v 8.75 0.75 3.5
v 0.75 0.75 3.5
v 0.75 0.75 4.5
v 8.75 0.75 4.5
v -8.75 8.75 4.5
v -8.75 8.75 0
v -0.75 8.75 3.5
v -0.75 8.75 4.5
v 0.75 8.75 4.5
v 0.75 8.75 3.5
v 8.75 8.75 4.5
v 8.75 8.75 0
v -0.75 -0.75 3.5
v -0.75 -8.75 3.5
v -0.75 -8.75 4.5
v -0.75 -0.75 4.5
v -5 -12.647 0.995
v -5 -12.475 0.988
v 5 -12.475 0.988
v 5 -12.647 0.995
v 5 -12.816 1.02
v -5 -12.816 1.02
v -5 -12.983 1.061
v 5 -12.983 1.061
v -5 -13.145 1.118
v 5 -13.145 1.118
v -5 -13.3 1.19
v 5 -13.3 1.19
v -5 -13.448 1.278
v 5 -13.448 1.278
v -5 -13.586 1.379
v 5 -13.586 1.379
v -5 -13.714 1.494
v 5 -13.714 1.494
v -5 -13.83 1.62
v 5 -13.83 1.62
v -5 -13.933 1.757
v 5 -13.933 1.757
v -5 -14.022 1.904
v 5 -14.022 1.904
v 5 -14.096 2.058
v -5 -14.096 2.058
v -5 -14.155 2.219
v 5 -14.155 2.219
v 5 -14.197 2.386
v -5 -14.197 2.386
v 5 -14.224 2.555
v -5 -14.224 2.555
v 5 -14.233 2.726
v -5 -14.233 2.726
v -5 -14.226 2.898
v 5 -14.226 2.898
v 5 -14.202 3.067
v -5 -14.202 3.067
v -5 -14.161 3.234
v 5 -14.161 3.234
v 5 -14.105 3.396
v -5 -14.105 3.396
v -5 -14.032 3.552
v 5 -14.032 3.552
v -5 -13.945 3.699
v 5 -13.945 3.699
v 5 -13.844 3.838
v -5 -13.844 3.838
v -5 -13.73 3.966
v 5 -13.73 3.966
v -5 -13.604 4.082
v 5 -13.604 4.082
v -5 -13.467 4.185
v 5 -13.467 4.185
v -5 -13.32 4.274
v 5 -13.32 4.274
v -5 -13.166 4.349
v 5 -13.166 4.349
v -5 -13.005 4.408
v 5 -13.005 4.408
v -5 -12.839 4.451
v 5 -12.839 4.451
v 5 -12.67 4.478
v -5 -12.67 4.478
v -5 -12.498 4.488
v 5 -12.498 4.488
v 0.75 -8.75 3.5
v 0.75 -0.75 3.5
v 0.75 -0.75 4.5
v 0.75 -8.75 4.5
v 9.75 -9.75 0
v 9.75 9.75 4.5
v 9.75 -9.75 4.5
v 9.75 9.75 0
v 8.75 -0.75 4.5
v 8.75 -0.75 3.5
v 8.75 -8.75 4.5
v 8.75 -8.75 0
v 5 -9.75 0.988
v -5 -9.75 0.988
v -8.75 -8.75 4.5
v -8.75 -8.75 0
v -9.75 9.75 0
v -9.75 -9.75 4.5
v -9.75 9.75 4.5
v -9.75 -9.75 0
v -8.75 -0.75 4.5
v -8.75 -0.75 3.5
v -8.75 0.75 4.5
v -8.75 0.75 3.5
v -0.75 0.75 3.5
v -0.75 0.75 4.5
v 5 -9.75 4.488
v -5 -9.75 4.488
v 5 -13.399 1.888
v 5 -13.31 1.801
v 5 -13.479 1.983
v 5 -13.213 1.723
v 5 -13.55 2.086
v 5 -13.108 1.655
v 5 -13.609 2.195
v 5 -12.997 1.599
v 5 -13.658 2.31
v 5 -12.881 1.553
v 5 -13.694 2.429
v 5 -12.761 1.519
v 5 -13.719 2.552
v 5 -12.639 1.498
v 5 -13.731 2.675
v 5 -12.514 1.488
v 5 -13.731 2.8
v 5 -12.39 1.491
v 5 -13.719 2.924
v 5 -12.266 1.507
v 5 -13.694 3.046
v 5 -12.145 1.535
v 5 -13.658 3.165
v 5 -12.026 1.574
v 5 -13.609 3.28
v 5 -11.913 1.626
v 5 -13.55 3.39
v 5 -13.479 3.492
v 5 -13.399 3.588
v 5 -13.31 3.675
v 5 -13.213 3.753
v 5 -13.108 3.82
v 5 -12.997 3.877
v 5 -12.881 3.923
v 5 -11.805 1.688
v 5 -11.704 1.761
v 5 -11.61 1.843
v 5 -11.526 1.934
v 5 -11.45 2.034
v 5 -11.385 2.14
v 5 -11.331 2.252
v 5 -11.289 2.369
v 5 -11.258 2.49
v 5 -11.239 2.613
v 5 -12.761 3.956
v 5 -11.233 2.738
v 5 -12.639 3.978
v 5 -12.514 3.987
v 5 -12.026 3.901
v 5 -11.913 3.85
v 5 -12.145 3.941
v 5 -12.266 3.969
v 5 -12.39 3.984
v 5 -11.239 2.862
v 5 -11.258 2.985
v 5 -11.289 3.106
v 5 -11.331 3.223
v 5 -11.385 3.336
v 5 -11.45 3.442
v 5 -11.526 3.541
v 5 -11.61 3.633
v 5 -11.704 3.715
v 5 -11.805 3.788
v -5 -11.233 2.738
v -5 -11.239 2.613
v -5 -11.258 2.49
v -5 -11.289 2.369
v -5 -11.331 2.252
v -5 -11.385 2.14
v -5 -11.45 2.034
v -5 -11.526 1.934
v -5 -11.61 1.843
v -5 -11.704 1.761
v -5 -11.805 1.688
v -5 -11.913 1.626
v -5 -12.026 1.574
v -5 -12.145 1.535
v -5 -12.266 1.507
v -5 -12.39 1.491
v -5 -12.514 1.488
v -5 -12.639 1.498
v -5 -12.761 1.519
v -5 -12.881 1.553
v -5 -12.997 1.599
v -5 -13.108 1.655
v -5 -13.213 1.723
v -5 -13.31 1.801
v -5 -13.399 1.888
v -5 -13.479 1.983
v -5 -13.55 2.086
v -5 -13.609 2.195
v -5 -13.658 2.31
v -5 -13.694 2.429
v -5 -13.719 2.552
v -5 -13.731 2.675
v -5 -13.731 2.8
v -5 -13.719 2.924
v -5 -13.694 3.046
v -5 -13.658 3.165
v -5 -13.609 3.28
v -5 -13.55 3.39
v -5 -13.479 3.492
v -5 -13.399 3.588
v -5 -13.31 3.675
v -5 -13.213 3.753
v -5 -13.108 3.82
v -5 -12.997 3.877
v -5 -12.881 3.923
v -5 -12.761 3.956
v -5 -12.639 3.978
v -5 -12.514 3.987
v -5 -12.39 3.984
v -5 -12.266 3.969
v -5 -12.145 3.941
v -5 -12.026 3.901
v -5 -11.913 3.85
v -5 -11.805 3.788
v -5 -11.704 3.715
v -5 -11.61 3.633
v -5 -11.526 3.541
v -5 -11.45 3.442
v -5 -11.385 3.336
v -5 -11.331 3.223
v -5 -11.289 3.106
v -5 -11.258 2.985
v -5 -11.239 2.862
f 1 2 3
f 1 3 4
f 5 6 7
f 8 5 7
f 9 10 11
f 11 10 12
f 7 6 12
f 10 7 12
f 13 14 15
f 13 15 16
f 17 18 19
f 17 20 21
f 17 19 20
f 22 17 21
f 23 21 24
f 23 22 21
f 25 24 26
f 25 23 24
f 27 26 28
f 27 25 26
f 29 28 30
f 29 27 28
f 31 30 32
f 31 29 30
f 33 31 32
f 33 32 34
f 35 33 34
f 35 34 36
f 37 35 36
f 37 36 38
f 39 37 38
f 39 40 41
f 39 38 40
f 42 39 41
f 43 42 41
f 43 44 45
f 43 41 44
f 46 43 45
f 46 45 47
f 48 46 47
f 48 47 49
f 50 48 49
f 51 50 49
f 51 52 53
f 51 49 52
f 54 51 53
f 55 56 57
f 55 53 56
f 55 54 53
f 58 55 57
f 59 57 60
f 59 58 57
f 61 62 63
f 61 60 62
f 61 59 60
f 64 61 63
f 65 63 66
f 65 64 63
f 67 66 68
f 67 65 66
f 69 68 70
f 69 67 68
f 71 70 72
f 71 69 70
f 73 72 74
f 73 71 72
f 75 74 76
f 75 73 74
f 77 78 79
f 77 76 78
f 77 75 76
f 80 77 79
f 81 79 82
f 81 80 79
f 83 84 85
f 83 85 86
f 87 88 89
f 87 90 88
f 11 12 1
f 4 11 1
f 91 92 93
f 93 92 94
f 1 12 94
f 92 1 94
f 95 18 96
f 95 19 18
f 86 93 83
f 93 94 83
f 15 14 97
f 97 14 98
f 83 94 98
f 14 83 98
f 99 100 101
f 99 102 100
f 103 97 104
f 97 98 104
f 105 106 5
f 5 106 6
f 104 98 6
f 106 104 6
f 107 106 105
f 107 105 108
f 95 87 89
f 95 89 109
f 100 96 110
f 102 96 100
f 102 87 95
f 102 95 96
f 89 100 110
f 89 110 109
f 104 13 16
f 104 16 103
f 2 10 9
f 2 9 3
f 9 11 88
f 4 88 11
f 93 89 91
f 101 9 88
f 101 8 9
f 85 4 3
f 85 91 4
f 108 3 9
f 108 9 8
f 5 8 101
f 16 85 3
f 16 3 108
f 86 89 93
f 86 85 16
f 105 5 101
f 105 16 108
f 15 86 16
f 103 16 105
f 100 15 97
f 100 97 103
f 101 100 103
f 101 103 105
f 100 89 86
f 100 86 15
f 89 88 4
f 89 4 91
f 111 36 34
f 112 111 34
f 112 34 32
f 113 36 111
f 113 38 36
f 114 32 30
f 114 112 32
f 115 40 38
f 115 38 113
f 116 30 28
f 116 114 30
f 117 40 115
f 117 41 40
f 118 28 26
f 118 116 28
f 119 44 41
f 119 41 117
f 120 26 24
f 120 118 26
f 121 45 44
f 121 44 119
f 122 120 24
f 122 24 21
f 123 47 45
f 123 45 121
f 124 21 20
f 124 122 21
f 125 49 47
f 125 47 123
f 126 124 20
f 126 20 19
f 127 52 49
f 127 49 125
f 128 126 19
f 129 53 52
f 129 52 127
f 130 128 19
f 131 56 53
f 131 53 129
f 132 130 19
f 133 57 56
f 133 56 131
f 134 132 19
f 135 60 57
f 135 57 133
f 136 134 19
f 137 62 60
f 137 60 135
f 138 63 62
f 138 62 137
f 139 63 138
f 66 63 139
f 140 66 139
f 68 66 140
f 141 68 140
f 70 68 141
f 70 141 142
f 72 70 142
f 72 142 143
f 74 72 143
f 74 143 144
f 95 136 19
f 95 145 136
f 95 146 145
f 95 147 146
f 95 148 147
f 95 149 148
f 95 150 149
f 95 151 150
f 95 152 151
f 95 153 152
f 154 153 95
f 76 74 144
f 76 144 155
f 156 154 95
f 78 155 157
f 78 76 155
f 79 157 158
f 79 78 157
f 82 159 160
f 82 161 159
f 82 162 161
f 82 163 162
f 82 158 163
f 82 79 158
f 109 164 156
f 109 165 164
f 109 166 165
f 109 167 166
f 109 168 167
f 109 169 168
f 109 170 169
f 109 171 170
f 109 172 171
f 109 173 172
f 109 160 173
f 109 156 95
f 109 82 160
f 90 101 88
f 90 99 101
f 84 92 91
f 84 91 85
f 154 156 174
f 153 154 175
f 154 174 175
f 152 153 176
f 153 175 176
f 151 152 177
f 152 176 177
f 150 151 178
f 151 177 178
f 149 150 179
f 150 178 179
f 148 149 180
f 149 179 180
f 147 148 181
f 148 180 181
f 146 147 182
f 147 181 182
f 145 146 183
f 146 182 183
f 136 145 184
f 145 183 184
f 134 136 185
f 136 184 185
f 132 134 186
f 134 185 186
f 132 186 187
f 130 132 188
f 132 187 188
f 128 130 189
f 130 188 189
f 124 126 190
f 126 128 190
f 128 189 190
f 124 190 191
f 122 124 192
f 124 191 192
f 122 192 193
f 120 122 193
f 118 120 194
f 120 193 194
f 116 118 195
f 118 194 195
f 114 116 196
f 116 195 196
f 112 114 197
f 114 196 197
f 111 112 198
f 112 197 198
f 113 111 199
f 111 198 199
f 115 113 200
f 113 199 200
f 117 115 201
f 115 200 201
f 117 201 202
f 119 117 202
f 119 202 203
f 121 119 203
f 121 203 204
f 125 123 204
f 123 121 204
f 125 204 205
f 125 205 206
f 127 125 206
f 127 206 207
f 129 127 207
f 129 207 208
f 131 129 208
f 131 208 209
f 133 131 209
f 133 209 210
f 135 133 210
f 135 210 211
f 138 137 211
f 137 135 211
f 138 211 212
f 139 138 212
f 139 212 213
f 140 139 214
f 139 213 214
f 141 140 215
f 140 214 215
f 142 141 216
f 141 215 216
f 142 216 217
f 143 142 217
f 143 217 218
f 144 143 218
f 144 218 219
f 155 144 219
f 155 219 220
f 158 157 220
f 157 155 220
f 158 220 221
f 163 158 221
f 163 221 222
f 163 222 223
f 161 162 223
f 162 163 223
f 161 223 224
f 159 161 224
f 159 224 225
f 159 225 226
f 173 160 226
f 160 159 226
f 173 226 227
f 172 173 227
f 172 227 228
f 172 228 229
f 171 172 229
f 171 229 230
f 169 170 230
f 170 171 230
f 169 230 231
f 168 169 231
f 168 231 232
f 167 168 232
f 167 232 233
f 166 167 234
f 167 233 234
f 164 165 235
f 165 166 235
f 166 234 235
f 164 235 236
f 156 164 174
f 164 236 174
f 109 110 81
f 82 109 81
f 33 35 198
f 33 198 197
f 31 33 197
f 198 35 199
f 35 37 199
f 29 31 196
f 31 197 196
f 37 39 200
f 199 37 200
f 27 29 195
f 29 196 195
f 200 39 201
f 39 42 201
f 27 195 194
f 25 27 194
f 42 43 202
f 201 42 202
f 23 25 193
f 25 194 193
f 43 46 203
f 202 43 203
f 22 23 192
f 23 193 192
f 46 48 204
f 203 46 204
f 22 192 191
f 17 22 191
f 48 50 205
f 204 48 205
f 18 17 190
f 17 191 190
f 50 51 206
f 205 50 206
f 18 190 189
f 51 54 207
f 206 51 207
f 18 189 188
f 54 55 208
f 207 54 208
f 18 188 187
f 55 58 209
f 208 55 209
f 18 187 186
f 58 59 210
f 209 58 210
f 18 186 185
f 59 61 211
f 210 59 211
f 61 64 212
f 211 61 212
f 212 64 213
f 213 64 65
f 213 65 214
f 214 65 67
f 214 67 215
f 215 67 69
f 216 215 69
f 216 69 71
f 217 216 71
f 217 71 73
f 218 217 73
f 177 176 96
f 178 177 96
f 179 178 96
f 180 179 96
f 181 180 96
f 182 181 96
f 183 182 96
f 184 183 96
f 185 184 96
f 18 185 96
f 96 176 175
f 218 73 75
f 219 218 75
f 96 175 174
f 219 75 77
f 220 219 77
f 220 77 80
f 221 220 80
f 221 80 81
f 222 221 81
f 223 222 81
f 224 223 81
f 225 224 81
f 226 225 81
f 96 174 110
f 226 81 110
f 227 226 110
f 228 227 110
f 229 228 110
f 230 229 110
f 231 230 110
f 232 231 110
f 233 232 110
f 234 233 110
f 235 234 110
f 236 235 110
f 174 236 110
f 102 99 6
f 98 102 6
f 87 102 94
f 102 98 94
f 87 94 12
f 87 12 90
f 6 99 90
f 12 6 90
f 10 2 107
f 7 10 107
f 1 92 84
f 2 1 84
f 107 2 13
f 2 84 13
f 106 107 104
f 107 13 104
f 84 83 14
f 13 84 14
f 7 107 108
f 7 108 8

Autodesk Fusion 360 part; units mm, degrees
sketch "Sketch1" plane through (0, 0, 0) normal (0, 0, 1) x (1, 0, 0)
  line L0 (8.75, -8.75) -> (-8.75, -8.75)
  line L1 (-8.75, -8.75) -> (-8.75, 8.75)
  line L2 (-8.75, 8.75) -> (8.75, 8.75)
  line L3 (8.75, 8.75) -> (8.75, -8.75)
  line L4 (8.75, -8.75) -> (-8.75, 8.75) construction
  line L5 (-8.75, -8.75) -> (8.75, 8.75) construction
  line L6 (9.75, -9.75) -> (-9.75, -9.75)
  line L7 (-9.75, -9.75) -> (-9.75, 9.75)
  line L8 (-9.75, 9.75) -> (9.75, 9.75)
  line L9 (9.75, 9.75) -> (9.75, -9.75)
  line L10 (9.75, -9.75) -> (-9.75, 9.75) construction
  line L11 (-9.75, -9.75) -> (9.75, 9.75) construction
  dimension "d1" = 17.5
  dimension "d2" = 17.5
  dimension "d3" = 19.5
  dimension "d4" = 19.5
extrude "Extrude1" add sketch "Sketch1" along normal blind 3.5
sketch "Sketch2" plane through (0, 0, 3.5) normal (0, 0, 1) x (-1, 0, 0)
  line L0 (8.75, -8.75) -> (-8.75, -8.75)
  line L1 (-8.75, -8.75) -> (-8.75, 8.75)
  line L2 (-8.75, 8.75) -> (8.75, 8.75)
  line L3 (8.75, 8.75) -> (8.75, -8.75)
  line L4 (-9.75, -9.75) -> (9.75, -9.75)
  line L5 (9.75, -9.75) -> (9.75, 9.75)
  line L6 (9.75, 9.75) -> (-9.75, 9.75)
  line L7 (-9.75, 9.75) -> (-9.75, -9.75)
  line L8 (0.75, -9.75) -> (-0.75, -9.75)
  line L9 (-0.75, -9.75) -> (-0.75, 9.75)
  line L10 (-0.75, 9.75) -> (0.75, 9.75)
  line L11 (0.75, 9.75) -> (0.75, -9.75)
  line L12 (0.75, -9.75) -> (-0.75, 9.75) construction
  line L13 (-0.75, -9.75) -> (0.75, 9.75) construction
  line L14 (9.75, -0.75) -> (-9.75, -0.75)
  line L15 (-9.75, -0.75) -> (-9.75, 0.75)
  line L16 (-9.75, 0.75) -> (9.75, 0.75)
  line L17 (9.75, 0.75) -> (9.75, -0.75)
  line L18 (9.75, -0.75) -> (-9.75, 0.75) construction
  line L19 (-9.75, -0.75) -> (9.75, 0.75) construction
  dimension "d7" = 1.5
  dimension "d8" = 1.5
extrude "Extrude2" add sketch "Sketch2" along normal blind 1 contours L0 L3 L4 L5 L11 L14 | L0 L4 L8 L9 L11 | L0 L9 L11 L14 | L3 L11 L14 L16 | L3 L5 L14 L16 L17 | L0 L1 L4 L7 L9 L14 | L9 L11 L14 L16 | L2 L3 L5 L6 L11 L16 | L1 L9 L14 L16 | L2 L9 L11 L16 | L1 L7 L14 L15 L16 | L2 L6 L9 L10 L11 | L1 L2 L6 L7 L9 L16
ref_plane "WorkPlane1" through (0, 0, 2.25) normal (1, 0, 0) x (0, 1, 0)
sketch "Sketch3" plane through (0, 0, 2.25) normal (1, 0, 0) x (0, 1, 0)
  line L0 (-9.7484, 2.2378) -> (-12.4984, 2.2378)
  line L1 (-12.4984, 2.2378) -> (-12.4984, -0.5122)
  line L2 (-12.4984, -0.5122) -> (-9.7484, -0.5122)
  line L3 (-9.7484, -0.5122) -> (-9.7484, 2.2378)
  circle A0 centre (-12.4831, 0.4878) radius 1.75
  circle A1 centre (-12.4831, 0.4878) radius 1.2499
  line L4 (-9.7484, -0.5122) -> (-12.4754, -0.5122)
  line L5 (-12.4754, -0.5122) -> (-12.4754, -1.2622)
  line L6 (-12.4754, -1.2622) -> (-9.7484, -1.2622)
  line L7 (-9.7484, -1.2622) -> (-9.7484, -0.5122)
  dimension "d12" = 2.75
  dimension "d13" = 2.75
  dimension "d14" = 3.5
  dimension "d15" = 2.4999
extrude "Extrude3" add sketch "Sketch3" along normal blind 5 contours L1 L2 A0 A1 L4 | L1 A0 A1 L5 | L0 L2 L3 A0 L4 | L2 A0 L4 L6 L7 | L2 A0 A1 L4 L5
extrude "Extrude4" add sketch "Sketch3" against normal blind 5 contours L1 L2 A0 A1 L4 | L1 A0 A1 L5 | L0 L2 L3 A0 L4 | L2 A0 L4 L6 L7 | L2 A0 A1 L4 L5
